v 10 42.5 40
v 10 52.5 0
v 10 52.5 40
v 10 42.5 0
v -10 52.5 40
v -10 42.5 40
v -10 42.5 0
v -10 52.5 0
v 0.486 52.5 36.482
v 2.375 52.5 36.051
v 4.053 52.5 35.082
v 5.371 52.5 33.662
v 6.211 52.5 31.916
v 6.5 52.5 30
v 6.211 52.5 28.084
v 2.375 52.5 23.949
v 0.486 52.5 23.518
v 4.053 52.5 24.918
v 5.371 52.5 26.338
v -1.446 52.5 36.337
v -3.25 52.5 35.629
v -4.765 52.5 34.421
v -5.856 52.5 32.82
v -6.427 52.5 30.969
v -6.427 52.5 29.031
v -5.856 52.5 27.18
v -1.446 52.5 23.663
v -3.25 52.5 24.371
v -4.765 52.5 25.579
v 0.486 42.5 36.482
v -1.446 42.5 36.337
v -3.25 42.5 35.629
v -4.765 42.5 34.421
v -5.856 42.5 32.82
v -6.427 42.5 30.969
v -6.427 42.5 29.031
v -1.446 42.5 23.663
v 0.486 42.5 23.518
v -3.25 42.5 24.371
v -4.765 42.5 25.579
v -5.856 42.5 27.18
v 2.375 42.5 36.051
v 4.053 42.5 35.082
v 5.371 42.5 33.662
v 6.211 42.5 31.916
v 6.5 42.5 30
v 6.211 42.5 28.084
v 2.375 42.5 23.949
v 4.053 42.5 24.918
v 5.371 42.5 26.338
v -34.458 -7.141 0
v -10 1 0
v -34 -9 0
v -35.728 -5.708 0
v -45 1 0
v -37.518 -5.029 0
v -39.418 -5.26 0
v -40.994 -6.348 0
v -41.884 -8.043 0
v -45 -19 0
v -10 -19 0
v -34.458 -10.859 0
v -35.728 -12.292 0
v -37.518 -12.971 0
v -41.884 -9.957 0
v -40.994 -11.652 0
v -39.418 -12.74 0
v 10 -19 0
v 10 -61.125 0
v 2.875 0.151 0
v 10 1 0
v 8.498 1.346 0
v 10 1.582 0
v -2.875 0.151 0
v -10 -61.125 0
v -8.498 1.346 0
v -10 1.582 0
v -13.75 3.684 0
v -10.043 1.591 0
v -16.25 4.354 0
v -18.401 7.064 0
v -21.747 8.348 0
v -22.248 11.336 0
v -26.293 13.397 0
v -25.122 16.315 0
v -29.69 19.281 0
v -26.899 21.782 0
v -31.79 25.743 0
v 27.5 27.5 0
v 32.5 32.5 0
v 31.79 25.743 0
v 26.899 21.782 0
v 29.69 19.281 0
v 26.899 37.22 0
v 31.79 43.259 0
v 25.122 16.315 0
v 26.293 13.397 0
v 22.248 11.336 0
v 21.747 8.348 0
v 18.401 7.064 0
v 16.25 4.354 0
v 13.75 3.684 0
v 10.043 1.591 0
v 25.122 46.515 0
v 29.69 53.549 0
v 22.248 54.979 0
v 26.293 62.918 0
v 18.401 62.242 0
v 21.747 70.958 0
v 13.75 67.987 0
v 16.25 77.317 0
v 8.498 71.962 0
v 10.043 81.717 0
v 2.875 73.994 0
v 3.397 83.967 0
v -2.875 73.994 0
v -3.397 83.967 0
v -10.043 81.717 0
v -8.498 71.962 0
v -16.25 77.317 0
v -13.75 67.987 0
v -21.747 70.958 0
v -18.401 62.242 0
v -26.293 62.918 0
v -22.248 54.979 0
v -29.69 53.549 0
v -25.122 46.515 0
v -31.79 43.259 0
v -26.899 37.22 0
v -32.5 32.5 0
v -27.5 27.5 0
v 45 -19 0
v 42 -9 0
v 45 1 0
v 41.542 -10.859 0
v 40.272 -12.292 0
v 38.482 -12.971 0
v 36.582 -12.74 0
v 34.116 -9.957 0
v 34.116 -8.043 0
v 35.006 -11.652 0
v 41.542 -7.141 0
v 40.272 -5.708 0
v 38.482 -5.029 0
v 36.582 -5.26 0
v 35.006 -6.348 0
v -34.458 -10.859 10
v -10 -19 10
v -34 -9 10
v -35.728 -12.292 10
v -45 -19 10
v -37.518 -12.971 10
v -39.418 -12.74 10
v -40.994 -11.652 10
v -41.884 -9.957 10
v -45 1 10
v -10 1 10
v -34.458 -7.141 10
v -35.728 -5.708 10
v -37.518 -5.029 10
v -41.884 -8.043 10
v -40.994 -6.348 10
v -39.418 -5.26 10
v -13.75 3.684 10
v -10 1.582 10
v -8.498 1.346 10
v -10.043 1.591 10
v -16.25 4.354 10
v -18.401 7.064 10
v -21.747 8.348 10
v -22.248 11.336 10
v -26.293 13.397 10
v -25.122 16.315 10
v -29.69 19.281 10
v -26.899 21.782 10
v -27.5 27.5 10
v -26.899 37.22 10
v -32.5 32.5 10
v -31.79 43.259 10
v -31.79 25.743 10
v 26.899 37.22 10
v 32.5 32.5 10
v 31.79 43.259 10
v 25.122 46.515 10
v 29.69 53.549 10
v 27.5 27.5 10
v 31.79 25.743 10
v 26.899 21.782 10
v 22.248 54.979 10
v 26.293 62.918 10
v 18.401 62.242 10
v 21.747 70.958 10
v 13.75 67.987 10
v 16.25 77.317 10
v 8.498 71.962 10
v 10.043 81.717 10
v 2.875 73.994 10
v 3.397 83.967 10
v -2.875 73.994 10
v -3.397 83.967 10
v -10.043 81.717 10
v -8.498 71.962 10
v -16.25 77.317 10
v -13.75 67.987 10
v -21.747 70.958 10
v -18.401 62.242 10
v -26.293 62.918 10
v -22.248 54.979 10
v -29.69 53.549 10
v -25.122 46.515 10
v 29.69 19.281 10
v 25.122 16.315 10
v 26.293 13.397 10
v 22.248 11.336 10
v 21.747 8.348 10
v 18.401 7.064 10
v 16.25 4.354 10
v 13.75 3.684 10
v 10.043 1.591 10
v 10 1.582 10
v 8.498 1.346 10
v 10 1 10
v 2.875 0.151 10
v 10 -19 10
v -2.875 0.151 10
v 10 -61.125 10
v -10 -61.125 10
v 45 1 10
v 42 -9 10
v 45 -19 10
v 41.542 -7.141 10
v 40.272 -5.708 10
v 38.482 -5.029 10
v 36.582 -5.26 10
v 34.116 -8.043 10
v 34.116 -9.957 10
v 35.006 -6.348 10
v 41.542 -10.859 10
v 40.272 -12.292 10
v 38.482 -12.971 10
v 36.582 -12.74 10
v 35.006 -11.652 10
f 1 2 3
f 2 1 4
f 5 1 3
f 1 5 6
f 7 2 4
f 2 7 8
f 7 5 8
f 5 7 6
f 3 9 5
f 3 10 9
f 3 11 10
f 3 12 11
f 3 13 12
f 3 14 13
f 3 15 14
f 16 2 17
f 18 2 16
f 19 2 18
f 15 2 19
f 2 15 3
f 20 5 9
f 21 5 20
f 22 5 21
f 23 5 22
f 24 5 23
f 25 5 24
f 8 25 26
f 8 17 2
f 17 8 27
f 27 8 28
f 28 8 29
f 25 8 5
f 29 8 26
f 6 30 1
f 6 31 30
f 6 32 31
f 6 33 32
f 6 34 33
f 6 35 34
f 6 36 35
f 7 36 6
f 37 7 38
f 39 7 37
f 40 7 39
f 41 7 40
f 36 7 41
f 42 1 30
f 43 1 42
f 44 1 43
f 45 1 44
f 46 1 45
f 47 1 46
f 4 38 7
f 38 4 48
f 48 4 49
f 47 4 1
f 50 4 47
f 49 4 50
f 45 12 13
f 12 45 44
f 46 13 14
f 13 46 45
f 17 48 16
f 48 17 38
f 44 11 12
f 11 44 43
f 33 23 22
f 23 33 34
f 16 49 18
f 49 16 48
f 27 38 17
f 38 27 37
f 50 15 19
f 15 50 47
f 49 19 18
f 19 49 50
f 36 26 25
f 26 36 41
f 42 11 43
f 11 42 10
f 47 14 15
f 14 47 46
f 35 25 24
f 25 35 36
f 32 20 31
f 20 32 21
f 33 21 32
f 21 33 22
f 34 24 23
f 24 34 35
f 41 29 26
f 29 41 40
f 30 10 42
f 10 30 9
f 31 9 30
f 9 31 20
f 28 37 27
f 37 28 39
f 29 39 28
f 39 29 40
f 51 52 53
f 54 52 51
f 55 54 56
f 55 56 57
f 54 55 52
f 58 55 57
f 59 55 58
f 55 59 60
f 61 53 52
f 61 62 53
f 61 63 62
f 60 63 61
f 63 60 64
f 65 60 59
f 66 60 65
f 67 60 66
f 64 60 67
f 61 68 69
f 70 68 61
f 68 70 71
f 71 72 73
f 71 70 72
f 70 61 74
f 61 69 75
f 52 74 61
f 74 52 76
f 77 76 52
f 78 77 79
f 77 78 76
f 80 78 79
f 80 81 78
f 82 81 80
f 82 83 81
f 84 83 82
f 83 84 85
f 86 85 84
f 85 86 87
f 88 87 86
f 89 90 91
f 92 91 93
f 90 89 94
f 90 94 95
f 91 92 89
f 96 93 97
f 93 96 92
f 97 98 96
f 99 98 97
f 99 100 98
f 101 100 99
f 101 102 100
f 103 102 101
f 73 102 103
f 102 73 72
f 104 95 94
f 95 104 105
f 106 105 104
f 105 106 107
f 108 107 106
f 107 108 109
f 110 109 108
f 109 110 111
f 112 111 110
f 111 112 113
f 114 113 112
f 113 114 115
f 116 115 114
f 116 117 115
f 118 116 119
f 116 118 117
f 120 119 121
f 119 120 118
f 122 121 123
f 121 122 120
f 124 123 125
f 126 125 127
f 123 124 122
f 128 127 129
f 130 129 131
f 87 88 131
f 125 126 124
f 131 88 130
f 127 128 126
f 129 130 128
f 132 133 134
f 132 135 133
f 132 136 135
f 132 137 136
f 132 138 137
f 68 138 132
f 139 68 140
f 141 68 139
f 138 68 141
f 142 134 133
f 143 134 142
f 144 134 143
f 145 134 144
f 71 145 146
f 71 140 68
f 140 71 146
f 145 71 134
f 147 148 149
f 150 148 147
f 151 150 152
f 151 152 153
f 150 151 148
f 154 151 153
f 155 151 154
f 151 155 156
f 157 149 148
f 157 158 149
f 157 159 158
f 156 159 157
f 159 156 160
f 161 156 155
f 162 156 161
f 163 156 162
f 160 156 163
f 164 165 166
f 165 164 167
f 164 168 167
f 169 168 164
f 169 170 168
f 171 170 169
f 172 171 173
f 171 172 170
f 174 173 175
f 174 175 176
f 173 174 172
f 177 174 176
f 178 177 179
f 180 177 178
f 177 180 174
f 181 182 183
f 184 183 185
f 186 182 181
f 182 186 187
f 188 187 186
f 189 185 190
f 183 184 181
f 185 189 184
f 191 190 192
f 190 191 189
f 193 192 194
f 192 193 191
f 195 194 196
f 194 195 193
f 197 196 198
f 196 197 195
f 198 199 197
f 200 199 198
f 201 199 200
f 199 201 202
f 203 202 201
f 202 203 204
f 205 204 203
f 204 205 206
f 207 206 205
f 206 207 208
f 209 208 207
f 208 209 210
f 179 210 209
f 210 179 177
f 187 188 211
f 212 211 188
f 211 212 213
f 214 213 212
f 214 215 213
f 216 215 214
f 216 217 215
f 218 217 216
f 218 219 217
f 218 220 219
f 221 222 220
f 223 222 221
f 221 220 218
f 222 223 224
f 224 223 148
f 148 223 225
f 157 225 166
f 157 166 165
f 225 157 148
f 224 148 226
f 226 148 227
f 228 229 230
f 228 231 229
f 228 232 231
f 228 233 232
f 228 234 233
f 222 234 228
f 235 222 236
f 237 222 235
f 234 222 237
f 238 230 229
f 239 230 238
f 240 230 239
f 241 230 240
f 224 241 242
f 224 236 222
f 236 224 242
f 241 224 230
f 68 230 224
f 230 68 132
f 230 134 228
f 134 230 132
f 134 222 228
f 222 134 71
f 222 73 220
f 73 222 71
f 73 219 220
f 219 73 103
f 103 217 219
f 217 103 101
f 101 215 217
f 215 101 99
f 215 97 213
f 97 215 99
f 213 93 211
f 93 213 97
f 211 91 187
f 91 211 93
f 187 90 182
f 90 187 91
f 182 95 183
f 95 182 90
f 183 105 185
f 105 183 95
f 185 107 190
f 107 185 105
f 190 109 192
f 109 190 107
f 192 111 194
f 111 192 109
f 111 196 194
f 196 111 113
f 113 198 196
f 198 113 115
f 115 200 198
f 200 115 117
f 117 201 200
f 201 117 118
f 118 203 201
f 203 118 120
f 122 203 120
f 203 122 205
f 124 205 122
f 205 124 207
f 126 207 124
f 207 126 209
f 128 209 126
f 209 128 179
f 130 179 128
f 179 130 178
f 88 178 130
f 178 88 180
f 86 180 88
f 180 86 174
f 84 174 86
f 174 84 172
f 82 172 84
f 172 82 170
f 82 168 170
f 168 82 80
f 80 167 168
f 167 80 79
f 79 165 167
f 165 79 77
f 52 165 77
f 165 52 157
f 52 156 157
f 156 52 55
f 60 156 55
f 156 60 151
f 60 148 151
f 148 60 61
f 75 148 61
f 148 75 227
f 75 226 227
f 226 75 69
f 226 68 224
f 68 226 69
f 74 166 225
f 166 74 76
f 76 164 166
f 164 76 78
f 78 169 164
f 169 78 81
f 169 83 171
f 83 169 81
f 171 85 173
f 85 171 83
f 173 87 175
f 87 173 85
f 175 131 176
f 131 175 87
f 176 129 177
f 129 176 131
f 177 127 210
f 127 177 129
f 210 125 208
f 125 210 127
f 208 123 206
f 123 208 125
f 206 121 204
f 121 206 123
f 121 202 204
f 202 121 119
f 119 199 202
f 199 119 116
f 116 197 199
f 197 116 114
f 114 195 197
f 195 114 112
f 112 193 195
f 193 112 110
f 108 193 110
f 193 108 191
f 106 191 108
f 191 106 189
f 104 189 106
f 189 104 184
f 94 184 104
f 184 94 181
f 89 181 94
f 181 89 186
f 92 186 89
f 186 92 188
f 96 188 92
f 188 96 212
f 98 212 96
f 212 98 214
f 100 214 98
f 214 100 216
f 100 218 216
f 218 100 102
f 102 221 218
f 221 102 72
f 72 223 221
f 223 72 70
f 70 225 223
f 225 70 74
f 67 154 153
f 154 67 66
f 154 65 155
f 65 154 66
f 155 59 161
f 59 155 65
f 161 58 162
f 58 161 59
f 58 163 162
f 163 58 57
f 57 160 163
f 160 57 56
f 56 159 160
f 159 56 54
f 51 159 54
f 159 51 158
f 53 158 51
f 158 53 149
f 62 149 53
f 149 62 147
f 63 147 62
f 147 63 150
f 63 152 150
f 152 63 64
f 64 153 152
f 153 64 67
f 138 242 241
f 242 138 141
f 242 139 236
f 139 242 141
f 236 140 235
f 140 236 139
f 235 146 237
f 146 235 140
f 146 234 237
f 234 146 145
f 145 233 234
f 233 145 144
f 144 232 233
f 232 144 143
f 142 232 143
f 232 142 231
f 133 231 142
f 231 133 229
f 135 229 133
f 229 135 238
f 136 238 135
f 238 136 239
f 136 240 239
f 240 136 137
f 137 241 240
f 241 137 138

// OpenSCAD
// Copyright 2010 Elmo Mäntynen
// Licensed as GPL 2 or later

// This is a holder for plants, to be used for indoor gardening.
// Idea is from the zengrow.com systems.

// This should hold the plants in holes made to the lid (or other sheet)
// of a water container. A pump pumps the water through a tube, and the
// other end of the tube is held over the plant. The water then returns
// to the container after passing the plant's roots.

include <MCAD/units.scad>
use <MCAD/shapes.scad>
use <MCAD/regular_shapes.scad>

// Plant hole dimensions
width = 5.5*cm;
length = width*1.35;

// Tube holder
tubeOD = 12*mm;

screw_hole = 4*mm;

module plant_holder(){
    union(){
        linear_extrude(height=10*mm)
        difference(){
            union(){
                egg_outline(width=width+10*mm, length=length+10*mm);
                translate([0, -0.9*cm, 0]) cross(3.5*cm+width, 3*cm+length, 2*cm);
            }
            egg_outline(width=width, length=length);
        }
        translate([0, width/2+20*mm, 20*mm]) tube_holder();
    }
}

module plant_hole(){egg_outline(width=width, length=length);}

module cross(x, y, thickness){
    union(){
        difference(){
            square([x, thickness], center=true);
            for(i = [-1, 1]){
                translate([i*(x/2-screw_hole-3*mm), 0, 0]) circle(r=screw_hole, center=true);
            }
        }
        square([thickness, y], center=true);
    }
}

module tube_holder(){
    difference(){
        box(20*mm, 10*mm, 40*mm);
        translate([0, 0, 10*mm]) rotate([90, 0, 0])
            cylinder(r=tubeOD/2+0.5*mm, h=20*mm, center=true);
    }
}

plant_holder();
